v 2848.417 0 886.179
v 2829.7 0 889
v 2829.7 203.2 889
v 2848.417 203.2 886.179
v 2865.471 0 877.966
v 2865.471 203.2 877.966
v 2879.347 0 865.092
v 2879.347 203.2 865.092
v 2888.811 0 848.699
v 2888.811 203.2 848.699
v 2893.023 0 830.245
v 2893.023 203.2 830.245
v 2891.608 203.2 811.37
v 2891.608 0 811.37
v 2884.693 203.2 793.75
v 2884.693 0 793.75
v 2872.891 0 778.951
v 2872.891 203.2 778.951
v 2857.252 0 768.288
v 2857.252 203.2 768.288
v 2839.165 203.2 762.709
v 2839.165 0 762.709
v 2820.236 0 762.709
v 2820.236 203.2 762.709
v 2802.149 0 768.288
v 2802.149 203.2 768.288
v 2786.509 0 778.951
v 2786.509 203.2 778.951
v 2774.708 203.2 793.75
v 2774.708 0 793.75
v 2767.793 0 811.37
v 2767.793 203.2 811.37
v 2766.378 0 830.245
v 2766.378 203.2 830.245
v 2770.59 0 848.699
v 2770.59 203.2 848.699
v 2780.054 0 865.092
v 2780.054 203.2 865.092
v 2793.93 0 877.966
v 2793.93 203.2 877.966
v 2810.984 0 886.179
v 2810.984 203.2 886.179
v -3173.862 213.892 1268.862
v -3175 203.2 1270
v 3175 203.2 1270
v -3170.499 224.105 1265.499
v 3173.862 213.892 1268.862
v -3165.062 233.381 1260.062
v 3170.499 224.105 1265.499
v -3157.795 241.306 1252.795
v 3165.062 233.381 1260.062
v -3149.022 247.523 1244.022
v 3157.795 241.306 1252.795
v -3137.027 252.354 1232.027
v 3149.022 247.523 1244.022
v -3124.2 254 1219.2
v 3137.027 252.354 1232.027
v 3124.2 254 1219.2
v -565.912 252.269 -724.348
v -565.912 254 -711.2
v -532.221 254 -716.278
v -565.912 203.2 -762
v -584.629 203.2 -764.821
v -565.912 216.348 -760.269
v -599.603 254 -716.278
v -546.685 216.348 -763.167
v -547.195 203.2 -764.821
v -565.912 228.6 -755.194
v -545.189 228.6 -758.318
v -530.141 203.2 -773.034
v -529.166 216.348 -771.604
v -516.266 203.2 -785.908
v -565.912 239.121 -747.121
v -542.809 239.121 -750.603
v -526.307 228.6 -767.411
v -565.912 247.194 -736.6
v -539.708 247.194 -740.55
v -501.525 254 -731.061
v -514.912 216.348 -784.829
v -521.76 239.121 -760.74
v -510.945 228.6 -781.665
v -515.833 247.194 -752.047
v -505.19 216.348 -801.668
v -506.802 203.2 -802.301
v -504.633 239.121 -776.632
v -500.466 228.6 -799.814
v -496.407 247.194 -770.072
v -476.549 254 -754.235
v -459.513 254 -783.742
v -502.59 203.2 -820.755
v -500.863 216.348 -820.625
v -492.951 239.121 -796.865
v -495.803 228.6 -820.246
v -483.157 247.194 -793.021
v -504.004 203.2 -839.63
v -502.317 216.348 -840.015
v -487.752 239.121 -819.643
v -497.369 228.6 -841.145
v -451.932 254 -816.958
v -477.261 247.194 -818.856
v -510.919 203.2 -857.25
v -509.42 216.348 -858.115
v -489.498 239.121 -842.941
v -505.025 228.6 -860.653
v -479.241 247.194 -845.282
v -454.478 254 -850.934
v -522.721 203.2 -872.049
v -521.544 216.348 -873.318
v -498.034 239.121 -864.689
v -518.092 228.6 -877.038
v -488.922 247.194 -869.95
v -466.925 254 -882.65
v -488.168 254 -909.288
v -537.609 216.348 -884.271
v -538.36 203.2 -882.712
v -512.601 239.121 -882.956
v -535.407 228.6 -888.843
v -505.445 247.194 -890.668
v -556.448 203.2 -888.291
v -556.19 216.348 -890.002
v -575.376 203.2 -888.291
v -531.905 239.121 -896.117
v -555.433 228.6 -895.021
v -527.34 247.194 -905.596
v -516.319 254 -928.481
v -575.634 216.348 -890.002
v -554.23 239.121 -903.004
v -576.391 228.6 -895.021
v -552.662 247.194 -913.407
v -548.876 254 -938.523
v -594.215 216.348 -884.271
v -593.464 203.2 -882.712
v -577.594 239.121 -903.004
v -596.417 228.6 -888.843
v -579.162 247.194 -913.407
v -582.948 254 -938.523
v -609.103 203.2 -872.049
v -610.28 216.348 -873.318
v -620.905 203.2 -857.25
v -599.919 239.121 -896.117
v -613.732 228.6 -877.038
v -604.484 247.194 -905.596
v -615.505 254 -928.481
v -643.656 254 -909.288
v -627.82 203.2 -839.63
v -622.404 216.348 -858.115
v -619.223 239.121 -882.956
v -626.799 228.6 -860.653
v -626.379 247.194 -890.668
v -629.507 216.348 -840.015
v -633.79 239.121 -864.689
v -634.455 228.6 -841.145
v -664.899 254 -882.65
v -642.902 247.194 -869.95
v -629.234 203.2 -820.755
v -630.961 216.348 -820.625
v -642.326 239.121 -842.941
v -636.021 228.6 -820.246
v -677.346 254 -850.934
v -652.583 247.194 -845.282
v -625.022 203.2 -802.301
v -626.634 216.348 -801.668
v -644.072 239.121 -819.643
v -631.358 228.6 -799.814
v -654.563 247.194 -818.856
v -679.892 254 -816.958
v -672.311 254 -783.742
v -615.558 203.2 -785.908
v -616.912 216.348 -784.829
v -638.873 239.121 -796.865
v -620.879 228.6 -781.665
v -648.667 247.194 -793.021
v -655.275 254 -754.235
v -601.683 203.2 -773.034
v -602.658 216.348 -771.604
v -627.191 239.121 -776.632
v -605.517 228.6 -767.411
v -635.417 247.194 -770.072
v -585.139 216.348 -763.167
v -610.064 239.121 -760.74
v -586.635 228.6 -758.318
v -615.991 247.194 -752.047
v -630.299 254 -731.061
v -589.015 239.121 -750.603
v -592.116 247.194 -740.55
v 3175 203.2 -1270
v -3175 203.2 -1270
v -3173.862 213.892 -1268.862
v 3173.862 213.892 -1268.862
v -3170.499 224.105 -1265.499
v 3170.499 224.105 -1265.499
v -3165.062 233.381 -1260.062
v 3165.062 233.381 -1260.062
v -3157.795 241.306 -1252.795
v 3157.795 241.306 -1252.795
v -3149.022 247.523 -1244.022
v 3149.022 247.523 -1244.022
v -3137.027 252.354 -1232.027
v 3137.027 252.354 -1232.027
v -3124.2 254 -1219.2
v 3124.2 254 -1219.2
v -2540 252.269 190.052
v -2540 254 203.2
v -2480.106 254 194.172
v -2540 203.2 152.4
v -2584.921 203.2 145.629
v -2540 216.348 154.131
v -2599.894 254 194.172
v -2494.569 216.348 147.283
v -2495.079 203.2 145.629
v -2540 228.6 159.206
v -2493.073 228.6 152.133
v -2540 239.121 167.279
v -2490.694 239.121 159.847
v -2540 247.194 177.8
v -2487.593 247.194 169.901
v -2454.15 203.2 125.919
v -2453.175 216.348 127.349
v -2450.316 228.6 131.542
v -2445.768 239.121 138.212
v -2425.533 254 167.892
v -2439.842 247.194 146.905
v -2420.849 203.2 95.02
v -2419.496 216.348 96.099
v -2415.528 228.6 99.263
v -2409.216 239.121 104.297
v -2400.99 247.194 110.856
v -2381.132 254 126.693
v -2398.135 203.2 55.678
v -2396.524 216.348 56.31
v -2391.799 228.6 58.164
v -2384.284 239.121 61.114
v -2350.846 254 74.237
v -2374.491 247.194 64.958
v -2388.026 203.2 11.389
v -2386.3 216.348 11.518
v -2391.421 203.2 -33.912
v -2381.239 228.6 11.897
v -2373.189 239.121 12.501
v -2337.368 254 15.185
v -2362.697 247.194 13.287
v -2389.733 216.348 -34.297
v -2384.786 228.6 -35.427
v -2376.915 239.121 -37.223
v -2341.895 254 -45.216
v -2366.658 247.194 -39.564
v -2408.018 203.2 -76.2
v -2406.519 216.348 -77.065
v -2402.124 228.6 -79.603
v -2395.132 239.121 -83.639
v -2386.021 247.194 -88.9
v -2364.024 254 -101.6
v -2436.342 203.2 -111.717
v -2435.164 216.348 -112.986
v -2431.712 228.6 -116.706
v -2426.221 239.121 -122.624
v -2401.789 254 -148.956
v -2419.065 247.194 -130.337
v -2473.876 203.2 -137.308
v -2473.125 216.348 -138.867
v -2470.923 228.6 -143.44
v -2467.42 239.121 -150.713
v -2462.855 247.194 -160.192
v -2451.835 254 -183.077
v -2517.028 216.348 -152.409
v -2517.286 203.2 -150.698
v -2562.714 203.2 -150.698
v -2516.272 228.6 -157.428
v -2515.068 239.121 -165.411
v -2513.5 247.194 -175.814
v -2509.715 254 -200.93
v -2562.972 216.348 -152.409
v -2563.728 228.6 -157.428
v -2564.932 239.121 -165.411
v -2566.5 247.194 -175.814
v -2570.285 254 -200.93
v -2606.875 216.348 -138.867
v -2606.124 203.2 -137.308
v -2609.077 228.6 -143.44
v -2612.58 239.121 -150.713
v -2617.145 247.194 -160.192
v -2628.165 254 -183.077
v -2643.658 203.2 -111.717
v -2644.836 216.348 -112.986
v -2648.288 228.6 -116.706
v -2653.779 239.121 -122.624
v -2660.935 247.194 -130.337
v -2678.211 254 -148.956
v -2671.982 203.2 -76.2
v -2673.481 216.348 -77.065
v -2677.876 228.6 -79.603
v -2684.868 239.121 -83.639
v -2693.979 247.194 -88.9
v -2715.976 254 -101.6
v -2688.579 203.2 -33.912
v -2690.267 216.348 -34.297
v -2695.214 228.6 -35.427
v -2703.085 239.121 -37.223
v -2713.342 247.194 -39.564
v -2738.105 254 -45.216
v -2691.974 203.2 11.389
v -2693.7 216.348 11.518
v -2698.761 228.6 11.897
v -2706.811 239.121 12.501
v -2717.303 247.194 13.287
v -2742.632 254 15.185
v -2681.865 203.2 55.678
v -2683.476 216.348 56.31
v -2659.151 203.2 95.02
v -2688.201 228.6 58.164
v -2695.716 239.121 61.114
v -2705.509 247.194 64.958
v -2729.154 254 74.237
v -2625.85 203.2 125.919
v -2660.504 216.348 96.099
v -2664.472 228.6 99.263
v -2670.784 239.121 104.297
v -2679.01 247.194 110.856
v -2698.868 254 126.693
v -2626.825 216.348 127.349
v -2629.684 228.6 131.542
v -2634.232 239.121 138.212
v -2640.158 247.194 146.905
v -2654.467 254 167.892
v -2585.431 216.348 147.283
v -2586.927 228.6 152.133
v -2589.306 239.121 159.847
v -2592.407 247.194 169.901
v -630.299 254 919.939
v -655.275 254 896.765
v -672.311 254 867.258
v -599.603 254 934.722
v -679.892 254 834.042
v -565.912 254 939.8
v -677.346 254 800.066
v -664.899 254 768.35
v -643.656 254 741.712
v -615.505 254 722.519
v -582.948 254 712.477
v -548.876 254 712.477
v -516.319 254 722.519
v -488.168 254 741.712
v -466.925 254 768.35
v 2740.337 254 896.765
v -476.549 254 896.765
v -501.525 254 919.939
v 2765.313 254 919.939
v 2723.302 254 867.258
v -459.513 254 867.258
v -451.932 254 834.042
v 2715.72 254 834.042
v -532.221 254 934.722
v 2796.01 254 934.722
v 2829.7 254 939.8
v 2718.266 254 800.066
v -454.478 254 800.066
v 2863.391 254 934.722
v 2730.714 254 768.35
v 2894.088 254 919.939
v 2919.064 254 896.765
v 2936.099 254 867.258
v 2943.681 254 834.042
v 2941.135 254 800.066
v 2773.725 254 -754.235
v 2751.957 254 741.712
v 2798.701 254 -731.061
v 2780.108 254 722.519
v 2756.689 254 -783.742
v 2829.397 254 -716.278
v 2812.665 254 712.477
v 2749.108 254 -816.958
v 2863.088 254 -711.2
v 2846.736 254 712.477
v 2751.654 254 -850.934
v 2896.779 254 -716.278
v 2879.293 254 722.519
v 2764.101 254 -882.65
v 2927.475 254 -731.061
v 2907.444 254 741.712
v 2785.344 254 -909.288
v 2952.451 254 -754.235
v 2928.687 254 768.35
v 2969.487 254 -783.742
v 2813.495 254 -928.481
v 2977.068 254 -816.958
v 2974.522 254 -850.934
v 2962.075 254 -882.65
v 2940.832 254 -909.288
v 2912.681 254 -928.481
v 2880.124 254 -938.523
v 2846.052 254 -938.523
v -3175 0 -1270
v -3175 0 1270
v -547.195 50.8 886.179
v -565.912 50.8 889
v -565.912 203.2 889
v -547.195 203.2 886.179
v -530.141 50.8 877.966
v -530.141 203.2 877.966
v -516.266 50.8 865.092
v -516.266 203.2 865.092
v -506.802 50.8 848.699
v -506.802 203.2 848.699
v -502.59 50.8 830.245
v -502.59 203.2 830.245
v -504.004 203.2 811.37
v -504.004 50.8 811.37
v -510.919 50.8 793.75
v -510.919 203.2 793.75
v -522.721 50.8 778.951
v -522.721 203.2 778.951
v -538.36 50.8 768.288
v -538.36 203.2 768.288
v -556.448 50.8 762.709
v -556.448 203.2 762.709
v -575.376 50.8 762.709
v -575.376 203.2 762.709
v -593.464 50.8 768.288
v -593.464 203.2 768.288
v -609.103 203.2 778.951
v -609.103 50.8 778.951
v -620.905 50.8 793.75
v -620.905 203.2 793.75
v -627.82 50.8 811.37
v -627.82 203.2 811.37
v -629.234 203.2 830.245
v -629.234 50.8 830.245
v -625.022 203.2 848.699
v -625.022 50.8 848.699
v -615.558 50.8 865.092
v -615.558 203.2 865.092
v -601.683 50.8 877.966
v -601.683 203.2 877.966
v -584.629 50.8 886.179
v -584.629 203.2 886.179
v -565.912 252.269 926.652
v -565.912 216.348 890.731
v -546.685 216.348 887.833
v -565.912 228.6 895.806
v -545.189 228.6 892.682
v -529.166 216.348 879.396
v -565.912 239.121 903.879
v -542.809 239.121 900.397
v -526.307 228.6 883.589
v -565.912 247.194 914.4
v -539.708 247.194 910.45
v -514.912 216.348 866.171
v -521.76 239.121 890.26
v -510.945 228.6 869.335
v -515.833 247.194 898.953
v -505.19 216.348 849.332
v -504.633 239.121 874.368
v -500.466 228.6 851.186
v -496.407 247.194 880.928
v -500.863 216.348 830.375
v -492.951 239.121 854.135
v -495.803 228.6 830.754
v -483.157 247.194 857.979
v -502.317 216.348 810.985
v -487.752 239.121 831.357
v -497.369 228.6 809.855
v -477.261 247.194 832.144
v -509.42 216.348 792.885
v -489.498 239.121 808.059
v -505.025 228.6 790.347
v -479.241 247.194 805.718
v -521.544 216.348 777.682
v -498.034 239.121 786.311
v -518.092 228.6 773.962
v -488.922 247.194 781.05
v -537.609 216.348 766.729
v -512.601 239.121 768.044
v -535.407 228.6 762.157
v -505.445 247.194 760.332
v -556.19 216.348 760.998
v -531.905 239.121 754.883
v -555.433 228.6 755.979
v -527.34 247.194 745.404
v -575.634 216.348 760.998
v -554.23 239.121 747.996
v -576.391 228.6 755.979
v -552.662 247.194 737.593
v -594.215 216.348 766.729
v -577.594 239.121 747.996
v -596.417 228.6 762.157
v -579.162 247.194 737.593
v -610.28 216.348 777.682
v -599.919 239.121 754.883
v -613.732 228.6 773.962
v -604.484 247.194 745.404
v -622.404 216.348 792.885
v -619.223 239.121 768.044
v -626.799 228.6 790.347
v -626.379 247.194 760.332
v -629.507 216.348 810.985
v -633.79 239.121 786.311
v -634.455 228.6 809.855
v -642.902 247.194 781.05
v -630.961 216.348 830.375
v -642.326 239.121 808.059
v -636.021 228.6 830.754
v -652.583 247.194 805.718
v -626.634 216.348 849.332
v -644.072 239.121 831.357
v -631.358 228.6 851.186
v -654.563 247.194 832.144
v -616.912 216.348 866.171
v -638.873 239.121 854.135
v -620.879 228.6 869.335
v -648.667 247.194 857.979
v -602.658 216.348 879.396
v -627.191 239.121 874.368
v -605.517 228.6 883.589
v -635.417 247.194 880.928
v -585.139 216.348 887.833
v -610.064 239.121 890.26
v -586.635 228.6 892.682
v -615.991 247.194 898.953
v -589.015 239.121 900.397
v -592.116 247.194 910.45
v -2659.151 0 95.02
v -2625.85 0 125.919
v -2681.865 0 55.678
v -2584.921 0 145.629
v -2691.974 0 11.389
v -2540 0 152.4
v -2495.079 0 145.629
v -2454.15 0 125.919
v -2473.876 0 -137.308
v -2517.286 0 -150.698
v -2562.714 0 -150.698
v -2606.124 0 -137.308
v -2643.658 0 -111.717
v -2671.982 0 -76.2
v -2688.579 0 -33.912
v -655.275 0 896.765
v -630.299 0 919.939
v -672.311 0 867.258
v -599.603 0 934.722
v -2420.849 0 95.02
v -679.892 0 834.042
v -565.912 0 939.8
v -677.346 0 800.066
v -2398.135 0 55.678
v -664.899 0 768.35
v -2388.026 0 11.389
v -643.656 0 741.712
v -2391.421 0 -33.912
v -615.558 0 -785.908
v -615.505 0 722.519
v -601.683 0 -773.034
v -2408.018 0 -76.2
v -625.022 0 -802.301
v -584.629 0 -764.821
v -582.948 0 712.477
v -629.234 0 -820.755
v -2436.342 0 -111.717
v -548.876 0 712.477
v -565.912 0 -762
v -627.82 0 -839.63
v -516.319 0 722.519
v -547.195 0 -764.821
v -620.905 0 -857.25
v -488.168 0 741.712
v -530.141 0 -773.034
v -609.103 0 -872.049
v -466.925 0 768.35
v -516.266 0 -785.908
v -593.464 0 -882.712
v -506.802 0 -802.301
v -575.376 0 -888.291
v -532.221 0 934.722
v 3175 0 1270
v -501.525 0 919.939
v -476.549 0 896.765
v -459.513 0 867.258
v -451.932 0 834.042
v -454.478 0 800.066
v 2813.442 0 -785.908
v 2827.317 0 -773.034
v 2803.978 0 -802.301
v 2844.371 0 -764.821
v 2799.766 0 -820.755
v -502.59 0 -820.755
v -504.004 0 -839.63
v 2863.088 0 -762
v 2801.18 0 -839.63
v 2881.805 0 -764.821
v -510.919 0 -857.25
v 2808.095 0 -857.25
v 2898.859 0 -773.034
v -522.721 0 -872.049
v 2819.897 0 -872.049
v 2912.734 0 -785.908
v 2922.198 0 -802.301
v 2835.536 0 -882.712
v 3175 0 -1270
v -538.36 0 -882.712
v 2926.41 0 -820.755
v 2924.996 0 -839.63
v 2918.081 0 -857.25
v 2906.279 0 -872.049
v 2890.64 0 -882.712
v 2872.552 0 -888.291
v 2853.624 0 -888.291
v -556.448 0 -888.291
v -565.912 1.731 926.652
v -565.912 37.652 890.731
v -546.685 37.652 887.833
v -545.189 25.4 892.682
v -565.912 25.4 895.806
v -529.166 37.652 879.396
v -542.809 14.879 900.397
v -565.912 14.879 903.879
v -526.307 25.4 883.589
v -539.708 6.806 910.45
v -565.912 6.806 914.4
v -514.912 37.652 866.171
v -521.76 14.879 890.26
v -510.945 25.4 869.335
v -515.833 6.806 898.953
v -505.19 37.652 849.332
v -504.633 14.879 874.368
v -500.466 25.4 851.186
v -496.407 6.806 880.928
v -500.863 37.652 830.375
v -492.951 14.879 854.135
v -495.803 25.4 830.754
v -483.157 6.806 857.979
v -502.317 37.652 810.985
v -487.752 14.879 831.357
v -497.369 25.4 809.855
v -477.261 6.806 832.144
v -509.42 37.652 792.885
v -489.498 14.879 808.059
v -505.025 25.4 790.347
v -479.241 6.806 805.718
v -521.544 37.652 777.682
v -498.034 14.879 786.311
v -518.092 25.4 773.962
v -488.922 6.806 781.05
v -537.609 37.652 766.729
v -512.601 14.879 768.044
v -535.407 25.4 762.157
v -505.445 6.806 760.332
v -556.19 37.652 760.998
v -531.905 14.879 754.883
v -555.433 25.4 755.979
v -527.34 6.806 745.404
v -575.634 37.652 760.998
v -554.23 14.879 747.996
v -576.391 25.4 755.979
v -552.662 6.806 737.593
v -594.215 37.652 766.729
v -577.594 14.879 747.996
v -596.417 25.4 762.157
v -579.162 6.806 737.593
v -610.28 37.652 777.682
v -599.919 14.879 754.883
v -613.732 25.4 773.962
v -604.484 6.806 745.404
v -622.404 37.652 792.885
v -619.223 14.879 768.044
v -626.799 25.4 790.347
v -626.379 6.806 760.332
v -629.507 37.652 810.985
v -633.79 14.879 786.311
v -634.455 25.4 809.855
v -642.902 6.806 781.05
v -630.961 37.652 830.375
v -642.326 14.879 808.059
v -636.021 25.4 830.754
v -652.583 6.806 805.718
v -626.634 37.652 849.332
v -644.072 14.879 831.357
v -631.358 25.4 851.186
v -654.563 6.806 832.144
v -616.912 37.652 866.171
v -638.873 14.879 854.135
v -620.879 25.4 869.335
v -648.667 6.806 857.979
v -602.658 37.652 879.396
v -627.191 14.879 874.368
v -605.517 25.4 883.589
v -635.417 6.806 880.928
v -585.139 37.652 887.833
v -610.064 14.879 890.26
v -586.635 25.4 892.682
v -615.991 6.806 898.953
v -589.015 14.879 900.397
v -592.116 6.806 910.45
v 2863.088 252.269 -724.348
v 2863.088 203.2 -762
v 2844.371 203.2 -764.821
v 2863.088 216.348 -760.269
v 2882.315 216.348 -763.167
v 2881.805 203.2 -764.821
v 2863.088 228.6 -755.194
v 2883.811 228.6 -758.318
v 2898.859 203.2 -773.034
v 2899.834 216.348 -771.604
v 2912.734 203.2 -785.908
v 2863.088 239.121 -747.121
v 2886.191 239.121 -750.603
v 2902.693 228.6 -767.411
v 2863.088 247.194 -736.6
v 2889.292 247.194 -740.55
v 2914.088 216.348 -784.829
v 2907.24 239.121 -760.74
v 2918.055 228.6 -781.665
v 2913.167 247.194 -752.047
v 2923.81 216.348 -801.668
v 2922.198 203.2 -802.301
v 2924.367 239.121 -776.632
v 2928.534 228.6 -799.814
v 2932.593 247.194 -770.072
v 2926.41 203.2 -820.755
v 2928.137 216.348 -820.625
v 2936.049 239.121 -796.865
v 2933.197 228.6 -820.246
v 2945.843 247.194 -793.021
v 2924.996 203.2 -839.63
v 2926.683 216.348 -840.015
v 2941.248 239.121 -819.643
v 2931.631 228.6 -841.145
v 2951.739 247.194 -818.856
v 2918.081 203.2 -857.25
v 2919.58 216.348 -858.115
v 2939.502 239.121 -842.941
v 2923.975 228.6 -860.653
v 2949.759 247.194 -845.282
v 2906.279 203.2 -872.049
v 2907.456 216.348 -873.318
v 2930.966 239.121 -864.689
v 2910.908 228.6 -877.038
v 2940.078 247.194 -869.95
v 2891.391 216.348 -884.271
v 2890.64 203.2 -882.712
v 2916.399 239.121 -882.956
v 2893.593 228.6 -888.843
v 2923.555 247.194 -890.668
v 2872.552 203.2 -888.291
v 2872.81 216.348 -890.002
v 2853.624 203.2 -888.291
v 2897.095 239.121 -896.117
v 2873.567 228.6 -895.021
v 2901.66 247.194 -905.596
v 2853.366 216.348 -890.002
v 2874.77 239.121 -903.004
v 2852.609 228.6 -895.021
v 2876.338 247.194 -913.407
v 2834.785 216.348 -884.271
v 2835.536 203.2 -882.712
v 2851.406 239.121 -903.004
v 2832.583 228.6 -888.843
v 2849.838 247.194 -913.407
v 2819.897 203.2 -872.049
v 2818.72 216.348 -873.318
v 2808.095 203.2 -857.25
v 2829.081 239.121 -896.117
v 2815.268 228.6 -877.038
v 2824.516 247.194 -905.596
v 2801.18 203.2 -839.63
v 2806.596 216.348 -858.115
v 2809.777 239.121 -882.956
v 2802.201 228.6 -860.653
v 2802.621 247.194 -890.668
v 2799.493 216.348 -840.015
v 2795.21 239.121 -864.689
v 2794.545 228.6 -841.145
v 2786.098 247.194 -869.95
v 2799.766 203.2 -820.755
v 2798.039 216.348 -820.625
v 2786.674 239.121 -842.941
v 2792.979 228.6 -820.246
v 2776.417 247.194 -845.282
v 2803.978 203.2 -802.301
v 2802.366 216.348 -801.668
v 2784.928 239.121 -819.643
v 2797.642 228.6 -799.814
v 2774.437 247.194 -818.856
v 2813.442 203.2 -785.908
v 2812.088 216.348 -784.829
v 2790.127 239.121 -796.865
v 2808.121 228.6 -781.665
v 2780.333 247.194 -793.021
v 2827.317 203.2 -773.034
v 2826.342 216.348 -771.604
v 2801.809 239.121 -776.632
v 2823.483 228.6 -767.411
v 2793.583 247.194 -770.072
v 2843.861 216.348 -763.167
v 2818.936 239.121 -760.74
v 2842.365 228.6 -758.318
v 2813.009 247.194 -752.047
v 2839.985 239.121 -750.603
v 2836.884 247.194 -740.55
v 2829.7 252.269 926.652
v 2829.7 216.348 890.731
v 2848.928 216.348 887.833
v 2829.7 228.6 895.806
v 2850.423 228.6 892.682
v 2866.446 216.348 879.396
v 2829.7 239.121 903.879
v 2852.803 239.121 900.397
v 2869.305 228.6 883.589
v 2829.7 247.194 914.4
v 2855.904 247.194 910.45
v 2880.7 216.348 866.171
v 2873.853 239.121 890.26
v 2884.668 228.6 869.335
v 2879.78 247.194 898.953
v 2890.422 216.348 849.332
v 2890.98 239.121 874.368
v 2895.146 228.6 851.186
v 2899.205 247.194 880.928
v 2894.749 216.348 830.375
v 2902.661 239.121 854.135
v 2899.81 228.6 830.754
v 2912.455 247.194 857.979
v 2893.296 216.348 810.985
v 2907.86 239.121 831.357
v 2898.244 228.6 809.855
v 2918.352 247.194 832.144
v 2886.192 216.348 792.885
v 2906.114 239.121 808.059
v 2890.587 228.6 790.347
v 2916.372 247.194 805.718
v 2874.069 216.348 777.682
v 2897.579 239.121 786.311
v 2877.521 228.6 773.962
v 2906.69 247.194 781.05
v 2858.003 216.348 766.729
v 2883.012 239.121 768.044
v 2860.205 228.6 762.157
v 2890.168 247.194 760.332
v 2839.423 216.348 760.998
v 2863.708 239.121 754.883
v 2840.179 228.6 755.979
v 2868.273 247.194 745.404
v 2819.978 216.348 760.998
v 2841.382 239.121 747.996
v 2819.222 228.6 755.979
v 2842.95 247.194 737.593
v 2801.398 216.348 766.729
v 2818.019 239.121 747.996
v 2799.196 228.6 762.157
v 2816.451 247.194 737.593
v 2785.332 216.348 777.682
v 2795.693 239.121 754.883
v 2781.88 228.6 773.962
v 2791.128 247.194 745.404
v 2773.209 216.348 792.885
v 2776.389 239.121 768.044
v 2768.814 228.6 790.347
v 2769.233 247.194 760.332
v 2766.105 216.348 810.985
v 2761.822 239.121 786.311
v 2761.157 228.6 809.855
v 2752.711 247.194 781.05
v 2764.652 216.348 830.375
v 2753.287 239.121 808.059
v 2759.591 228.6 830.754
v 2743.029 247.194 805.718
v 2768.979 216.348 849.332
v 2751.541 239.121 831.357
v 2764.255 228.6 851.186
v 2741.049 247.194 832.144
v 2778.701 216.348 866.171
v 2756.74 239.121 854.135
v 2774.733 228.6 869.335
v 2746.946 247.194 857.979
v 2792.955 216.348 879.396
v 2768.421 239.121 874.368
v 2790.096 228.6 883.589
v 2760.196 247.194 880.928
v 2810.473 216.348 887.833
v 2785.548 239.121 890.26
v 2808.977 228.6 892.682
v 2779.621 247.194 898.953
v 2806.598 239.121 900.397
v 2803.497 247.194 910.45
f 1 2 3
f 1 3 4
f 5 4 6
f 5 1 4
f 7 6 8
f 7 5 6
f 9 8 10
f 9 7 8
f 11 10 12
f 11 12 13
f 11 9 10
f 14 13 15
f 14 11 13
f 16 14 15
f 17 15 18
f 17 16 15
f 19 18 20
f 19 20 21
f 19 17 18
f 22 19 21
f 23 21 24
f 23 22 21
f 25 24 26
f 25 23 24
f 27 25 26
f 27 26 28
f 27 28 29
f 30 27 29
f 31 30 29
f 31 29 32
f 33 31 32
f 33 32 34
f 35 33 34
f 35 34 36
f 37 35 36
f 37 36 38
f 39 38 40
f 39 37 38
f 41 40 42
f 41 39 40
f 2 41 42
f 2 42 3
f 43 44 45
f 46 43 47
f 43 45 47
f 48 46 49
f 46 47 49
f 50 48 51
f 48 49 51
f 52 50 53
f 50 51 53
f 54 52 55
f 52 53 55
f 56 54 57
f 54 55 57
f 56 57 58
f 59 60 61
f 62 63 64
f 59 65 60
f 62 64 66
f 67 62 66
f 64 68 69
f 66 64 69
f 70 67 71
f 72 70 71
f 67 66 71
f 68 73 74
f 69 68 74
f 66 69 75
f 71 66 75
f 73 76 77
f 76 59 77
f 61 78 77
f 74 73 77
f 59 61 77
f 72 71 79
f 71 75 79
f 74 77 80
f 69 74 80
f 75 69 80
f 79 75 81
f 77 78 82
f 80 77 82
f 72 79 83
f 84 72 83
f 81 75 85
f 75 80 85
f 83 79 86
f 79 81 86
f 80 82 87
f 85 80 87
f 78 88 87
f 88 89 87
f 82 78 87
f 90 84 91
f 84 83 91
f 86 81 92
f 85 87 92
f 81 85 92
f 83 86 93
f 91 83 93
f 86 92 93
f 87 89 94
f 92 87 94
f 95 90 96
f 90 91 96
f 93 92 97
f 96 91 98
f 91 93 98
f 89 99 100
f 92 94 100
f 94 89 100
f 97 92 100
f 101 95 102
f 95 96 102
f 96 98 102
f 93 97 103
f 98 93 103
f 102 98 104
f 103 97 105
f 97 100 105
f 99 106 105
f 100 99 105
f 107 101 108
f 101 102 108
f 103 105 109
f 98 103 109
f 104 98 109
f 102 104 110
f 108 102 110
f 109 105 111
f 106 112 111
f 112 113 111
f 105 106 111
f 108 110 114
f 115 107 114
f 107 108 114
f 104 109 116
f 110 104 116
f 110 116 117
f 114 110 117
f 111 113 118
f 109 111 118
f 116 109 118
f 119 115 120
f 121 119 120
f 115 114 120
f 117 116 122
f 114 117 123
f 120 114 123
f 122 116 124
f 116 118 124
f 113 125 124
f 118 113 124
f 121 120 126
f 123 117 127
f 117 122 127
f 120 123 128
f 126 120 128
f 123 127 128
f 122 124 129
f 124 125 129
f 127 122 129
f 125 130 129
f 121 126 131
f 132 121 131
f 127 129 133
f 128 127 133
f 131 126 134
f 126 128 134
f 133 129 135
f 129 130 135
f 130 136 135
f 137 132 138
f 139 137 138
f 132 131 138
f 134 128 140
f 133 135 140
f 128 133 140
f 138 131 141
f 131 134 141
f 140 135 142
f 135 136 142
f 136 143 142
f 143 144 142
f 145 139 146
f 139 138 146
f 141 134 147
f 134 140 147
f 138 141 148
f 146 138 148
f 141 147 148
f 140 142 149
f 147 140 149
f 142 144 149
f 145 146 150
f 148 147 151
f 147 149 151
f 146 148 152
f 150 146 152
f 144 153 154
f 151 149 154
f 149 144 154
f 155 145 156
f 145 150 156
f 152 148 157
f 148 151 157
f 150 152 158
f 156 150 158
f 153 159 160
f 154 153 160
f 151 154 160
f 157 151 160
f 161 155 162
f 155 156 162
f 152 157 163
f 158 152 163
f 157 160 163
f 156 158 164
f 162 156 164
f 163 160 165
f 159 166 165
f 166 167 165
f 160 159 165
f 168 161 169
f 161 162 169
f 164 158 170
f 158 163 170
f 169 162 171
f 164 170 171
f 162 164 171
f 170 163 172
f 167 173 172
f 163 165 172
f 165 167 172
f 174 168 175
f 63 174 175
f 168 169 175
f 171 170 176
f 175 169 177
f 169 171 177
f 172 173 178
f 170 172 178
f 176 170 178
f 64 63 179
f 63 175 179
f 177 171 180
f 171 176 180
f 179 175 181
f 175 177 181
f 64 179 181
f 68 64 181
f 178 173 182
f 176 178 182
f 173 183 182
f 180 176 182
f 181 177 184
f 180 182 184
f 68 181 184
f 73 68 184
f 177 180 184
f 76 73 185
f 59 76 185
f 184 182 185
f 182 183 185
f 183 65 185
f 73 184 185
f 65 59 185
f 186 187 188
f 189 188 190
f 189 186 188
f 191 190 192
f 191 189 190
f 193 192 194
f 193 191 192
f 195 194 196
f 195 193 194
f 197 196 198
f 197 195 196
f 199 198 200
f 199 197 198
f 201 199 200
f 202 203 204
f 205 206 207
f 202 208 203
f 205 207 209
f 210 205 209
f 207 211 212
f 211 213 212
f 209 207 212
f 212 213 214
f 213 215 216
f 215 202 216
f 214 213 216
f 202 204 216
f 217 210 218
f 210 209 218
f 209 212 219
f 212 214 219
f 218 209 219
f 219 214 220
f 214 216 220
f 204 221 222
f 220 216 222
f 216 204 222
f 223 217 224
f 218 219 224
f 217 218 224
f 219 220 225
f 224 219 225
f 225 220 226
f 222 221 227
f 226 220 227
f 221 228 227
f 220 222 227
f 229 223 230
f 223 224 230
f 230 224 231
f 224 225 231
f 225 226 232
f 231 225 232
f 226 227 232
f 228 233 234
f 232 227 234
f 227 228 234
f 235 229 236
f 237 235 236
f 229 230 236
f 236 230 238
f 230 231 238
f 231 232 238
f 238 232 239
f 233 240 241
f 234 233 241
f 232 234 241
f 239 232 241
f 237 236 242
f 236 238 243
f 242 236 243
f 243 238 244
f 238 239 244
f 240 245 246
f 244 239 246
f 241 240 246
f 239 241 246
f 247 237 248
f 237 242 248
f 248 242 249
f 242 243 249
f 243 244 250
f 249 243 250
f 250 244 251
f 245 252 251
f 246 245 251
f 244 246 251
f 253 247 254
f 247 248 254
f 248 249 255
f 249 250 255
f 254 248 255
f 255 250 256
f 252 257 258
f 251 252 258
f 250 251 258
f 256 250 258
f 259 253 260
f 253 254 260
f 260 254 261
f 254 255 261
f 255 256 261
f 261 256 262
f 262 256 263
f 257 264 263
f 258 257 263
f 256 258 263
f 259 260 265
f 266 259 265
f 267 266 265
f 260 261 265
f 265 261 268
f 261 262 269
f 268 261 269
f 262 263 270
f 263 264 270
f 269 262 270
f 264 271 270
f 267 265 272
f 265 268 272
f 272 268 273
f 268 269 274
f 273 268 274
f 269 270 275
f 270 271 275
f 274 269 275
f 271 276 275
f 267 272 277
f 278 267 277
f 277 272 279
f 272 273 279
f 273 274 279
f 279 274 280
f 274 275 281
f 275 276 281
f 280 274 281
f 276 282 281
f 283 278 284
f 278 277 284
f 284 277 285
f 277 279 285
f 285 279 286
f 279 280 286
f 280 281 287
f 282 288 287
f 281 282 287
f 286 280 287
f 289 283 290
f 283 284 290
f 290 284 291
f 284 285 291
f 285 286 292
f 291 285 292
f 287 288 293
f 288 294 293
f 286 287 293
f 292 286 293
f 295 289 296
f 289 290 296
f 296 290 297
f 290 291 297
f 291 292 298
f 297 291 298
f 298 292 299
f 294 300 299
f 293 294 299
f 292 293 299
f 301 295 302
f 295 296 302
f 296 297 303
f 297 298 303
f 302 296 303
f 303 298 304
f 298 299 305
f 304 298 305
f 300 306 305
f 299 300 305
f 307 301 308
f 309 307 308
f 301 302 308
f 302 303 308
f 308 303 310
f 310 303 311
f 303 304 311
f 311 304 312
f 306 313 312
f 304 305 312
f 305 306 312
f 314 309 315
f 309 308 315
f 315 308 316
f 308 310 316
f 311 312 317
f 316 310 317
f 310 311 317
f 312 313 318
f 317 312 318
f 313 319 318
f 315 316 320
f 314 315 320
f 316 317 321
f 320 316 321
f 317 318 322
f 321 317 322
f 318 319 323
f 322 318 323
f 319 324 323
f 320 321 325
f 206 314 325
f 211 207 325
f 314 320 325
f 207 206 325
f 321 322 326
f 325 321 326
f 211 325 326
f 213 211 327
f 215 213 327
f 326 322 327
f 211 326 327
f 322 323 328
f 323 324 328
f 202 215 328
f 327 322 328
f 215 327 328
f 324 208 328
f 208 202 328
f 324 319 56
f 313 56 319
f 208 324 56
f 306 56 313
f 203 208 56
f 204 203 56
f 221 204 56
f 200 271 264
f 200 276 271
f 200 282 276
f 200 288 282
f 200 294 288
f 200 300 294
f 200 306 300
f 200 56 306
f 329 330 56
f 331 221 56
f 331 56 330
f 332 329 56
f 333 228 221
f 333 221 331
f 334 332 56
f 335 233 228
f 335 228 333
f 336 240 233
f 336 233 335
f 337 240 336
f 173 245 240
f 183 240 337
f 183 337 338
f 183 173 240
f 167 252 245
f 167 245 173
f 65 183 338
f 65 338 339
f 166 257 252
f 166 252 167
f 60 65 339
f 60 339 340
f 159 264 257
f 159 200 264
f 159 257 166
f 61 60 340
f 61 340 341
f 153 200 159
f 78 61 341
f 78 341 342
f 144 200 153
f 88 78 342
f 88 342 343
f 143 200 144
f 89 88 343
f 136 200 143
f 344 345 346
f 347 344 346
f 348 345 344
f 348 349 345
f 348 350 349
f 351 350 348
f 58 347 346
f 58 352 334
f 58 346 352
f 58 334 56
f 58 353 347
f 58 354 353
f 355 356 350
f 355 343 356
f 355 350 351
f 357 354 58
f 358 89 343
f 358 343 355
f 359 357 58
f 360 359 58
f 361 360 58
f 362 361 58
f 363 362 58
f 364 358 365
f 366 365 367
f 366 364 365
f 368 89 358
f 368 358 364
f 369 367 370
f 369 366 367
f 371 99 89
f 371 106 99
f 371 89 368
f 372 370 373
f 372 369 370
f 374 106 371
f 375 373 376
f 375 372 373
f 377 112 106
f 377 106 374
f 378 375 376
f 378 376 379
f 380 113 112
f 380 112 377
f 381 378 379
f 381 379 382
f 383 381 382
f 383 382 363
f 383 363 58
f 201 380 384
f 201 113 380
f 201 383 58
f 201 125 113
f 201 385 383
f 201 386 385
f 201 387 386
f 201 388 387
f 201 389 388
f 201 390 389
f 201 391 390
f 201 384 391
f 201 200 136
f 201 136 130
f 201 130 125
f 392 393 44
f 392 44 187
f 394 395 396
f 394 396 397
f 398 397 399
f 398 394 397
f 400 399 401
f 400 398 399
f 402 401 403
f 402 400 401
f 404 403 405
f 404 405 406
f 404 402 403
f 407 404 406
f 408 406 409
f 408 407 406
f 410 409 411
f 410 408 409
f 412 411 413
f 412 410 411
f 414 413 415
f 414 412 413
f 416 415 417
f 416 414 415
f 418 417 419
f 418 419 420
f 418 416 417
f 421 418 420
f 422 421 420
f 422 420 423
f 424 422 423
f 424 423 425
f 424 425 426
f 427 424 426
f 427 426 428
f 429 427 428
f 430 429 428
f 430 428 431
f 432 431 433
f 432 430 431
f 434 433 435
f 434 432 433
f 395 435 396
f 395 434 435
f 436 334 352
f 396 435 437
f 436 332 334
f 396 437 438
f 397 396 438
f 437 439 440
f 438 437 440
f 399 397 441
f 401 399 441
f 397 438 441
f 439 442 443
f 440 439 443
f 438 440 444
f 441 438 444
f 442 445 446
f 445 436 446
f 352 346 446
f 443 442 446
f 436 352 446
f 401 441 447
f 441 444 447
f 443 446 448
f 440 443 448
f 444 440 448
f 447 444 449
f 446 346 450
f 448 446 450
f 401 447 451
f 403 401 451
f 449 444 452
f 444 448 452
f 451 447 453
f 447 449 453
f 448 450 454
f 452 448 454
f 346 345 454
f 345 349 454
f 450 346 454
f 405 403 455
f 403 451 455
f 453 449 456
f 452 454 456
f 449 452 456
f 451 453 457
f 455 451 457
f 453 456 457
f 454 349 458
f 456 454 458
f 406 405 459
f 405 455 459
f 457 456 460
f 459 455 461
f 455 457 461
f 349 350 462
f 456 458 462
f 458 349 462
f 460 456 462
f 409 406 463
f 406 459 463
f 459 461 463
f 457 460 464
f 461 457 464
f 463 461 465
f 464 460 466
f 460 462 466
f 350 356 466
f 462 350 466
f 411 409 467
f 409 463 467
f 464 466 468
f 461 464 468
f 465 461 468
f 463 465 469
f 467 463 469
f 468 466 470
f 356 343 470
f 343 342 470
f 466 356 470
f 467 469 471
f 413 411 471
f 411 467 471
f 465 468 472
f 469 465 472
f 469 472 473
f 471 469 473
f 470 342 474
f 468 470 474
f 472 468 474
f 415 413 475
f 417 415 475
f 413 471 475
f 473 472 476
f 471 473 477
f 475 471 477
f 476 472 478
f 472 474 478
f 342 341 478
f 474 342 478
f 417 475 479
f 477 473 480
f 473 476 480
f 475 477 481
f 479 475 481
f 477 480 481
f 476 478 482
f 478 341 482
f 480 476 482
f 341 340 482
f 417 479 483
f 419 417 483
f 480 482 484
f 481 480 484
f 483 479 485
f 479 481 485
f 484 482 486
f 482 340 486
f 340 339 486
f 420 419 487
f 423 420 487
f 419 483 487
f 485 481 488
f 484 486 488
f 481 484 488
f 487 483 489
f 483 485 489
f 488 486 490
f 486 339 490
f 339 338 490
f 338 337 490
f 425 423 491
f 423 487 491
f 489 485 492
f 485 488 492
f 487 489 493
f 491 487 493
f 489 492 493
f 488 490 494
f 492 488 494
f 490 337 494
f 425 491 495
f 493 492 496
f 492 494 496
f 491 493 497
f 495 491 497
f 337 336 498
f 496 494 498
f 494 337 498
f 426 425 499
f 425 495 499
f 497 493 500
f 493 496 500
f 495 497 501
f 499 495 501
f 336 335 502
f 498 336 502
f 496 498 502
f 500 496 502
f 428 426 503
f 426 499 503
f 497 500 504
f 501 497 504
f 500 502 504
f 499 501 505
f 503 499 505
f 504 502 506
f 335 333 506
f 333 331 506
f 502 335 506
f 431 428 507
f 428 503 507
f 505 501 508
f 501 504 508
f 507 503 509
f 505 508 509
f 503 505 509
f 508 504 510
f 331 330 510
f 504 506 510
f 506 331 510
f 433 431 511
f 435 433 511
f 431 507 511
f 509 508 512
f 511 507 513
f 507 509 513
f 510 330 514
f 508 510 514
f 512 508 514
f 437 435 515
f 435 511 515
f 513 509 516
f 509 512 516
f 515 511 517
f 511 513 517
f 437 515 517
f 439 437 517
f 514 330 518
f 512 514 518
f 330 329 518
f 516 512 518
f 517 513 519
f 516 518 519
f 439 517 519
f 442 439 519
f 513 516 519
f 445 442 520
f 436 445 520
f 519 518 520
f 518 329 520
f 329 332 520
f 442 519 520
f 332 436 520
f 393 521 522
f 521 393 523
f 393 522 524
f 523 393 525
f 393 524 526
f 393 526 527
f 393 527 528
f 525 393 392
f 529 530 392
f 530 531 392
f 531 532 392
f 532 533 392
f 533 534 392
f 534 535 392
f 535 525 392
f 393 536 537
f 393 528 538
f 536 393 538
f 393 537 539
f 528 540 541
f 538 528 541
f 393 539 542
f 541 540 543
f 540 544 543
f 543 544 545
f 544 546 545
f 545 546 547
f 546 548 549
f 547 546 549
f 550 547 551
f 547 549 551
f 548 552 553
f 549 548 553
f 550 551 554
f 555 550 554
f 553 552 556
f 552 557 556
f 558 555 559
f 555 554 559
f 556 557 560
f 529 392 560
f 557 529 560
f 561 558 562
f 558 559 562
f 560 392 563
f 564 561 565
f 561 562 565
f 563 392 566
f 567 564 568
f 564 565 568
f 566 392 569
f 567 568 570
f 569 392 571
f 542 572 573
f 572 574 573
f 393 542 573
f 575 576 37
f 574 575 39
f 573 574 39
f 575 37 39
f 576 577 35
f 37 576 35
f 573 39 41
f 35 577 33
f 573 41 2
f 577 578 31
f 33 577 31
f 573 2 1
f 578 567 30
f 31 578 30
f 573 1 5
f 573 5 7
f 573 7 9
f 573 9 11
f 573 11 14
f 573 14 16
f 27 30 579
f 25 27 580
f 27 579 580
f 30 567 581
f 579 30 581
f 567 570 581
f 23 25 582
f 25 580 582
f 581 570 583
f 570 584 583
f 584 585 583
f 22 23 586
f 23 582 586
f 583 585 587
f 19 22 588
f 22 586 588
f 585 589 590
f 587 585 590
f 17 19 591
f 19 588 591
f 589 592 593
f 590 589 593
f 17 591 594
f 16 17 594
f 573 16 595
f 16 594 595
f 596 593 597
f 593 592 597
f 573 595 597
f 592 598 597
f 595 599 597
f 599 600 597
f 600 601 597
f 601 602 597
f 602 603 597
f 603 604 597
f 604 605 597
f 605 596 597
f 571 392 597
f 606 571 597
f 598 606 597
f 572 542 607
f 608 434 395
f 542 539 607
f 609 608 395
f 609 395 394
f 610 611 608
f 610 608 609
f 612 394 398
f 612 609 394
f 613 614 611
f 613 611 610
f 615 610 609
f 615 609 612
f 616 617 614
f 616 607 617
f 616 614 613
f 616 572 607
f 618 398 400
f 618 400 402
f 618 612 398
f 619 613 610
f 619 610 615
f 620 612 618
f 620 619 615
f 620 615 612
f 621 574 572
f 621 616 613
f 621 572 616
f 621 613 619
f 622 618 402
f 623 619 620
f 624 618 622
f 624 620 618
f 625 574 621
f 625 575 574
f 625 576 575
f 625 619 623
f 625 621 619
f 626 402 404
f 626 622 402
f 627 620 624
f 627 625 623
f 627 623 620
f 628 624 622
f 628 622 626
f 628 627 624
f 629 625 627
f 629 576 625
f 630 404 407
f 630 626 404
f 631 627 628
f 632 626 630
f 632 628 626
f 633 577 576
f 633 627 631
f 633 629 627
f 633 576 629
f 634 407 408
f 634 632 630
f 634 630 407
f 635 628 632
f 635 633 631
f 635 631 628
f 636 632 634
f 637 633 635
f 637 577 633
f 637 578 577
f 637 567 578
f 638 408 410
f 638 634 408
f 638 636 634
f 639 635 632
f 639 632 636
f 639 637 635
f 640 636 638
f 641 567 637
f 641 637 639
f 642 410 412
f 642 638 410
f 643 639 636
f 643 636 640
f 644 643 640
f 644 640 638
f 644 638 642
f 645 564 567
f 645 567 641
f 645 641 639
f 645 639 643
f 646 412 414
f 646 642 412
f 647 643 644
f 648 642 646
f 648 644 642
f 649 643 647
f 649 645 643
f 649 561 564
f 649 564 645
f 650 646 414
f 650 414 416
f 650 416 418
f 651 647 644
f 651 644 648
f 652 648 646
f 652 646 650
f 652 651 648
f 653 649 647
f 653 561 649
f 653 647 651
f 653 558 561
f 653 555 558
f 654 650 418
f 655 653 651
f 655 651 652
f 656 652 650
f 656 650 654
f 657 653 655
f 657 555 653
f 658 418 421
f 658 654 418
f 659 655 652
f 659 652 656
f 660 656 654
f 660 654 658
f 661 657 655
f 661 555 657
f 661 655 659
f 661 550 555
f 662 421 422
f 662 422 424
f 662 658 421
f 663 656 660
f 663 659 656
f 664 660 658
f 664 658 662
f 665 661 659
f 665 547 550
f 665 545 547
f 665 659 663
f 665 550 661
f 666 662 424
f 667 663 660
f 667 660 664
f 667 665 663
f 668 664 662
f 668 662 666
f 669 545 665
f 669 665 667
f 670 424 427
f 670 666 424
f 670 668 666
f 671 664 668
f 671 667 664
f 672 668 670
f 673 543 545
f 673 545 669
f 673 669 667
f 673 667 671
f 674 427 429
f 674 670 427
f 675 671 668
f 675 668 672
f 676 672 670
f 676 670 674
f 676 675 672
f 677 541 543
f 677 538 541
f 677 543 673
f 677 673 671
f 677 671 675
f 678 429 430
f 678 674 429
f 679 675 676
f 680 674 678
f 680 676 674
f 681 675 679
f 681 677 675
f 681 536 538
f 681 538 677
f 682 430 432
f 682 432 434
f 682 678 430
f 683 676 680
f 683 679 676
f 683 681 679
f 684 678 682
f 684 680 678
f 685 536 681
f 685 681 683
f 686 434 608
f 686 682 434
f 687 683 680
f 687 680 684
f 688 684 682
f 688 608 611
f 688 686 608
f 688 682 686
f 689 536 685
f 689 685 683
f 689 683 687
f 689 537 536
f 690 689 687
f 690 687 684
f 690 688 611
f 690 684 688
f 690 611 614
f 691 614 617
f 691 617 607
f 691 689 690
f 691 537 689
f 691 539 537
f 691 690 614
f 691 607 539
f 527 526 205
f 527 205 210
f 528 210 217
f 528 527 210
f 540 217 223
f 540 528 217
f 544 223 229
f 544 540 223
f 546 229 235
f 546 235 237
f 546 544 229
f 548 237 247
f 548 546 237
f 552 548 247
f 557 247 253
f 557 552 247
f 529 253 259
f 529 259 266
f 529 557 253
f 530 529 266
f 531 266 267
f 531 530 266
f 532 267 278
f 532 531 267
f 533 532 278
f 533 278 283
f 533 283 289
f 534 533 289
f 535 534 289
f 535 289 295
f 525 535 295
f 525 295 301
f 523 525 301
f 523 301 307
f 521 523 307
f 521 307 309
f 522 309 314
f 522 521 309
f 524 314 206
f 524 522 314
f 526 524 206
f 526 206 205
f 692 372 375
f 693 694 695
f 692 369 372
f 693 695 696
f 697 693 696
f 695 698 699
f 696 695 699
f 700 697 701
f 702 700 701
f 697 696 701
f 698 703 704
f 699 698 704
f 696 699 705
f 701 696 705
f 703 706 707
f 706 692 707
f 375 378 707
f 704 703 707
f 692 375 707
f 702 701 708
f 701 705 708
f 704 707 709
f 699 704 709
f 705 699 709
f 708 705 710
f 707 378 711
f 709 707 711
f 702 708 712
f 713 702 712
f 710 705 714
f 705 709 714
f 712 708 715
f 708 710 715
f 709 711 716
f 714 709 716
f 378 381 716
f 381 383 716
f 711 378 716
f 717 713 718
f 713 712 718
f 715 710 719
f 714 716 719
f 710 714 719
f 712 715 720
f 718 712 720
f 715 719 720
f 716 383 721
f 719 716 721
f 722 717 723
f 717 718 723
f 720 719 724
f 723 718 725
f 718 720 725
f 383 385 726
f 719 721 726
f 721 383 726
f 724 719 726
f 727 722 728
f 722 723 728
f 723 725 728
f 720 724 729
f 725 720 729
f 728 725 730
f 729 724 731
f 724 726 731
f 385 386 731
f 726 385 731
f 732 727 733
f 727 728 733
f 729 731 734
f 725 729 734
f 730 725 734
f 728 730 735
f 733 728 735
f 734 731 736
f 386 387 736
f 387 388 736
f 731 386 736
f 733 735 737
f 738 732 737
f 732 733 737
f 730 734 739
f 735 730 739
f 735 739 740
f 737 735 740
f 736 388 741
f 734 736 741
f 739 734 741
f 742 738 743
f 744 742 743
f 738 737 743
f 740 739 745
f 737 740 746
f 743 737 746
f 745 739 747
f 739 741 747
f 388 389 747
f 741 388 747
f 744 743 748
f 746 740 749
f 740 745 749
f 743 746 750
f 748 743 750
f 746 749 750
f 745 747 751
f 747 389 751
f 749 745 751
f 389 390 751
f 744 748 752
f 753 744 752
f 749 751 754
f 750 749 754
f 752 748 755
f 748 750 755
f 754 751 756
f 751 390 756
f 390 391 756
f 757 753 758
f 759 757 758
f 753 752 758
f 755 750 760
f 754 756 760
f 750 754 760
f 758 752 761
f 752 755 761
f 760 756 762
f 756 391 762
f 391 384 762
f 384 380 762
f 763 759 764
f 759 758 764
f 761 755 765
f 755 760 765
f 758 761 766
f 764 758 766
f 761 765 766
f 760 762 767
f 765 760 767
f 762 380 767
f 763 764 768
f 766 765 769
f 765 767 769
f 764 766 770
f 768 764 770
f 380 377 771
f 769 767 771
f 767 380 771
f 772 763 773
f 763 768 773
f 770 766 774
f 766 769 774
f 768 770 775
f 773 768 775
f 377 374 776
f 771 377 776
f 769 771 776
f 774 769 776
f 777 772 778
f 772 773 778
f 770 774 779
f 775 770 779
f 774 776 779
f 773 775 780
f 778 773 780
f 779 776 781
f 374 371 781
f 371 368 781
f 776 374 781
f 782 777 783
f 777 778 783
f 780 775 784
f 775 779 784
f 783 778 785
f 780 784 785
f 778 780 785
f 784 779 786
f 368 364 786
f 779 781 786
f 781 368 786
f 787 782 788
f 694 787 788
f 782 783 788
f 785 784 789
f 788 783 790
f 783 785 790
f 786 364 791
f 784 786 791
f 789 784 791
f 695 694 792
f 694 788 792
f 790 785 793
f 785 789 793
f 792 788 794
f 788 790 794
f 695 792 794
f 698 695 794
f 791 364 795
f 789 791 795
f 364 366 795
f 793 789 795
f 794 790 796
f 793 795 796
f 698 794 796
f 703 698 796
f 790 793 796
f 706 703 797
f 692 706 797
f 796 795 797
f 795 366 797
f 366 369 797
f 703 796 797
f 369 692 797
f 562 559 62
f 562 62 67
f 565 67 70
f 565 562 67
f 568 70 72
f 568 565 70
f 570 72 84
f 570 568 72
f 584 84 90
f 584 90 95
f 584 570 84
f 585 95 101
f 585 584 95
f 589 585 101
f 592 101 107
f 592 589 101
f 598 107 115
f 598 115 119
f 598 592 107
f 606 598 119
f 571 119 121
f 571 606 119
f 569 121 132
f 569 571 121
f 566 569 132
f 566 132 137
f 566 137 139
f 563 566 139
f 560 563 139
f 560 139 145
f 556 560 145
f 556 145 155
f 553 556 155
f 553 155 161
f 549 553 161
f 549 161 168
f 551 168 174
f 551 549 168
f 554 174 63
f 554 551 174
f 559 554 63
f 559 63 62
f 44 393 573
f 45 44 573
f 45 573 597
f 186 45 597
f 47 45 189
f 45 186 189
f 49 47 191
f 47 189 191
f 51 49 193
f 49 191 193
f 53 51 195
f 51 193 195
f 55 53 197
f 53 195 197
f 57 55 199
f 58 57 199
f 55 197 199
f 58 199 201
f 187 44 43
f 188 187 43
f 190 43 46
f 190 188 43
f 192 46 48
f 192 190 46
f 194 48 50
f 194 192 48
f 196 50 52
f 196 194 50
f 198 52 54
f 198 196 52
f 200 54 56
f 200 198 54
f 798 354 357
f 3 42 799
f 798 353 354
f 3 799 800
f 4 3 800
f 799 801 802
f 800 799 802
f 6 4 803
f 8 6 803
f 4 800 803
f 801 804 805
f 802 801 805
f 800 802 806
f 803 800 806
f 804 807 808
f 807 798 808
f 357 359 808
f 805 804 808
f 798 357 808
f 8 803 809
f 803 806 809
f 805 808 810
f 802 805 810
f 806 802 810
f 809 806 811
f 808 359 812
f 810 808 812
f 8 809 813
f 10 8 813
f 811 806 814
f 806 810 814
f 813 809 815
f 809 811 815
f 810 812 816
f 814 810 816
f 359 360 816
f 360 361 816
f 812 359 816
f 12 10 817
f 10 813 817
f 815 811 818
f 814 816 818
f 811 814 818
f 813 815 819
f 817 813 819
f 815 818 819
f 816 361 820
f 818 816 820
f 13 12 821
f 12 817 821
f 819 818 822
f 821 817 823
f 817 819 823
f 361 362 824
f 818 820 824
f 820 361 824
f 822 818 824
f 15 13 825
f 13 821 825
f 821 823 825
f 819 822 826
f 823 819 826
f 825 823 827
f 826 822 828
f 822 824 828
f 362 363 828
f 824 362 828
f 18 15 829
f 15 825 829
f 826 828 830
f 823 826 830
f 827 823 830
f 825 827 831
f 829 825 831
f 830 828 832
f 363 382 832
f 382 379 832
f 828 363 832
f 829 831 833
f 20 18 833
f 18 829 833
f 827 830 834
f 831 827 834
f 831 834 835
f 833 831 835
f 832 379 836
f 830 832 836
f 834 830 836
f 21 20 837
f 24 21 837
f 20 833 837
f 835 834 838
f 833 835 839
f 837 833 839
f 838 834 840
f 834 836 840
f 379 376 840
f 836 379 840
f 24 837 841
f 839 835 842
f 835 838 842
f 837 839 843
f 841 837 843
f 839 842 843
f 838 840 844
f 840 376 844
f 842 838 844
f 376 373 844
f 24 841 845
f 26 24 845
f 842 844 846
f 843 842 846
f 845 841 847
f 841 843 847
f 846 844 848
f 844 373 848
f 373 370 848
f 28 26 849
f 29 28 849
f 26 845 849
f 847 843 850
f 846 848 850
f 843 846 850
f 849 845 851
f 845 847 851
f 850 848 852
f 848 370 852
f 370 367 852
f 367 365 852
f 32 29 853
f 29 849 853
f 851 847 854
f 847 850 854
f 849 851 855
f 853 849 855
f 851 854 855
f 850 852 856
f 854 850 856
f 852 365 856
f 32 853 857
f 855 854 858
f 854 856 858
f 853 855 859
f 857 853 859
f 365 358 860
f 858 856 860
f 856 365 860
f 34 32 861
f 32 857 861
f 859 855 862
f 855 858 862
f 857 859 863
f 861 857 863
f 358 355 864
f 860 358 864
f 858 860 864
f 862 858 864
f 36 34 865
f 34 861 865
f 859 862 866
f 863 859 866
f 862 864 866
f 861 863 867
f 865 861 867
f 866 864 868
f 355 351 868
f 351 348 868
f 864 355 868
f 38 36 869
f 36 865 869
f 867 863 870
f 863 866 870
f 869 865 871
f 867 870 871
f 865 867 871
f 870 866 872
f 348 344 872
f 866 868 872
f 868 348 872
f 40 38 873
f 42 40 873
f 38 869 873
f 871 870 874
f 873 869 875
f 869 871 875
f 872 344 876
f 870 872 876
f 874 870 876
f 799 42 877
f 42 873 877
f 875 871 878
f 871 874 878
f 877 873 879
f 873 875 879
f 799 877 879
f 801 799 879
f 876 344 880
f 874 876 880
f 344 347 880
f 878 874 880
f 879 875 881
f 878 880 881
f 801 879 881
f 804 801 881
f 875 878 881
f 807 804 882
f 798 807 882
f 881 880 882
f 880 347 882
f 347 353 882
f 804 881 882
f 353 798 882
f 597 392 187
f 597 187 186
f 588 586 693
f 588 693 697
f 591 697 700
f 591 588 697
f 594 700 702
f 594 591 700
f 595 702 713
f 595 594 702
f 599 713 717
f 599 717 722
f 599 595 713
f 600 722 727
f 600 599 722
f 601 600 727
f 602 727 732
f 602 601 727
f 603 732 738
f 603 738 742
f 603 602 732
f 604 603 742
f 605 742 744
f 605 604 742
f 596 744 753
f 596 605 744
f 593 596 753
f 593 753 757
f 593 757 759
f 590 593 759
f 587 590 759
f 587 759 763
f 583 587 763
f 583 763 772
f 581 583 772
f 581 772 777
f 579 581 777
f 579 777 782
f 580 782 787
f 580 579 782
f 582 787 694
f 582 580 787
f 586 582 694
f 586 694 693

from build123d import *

# Parameters (mm, degrees)
SKETCH1_W           = 6350
SKETCH1_H           = 2540
SKETCH1_R           = 152.4
SKETCH1_R_2         = 63.5
BOSS_EXTRUDE1_DEPTH = 254
FILLET1_R           = 50.8


with BuildPart() as part:
    # Sketch1 → Boss-Extrude1 (new body)
    with BuildSketch(Plane(origin=(0, 0, 0), x_dir=(1, 0, 0), z_dir=(0, 1, 0))):
        Rectangle(SKETCH1_W, SKETCH1_H)
        with Locations(Location((-2540, 0, 0), (0, 0, 270))):
            Circle(SKETCH1_R, mode=Mode.SUBTRACT)
        with Locations(Location((-565.912, 825.5, 0), (0, 0, 270))):
            Circle(SKETCH1_R_2, mode=Mode.SUBTRACT)
        with Locations(Location((-565.912, -825.5, 0), (0, 0, 270))):
            Circle(SKETCH1_R_2, mode=Mode.SUBTRACT)
        with Locations(Location((2829.700460829, -825.5, 0), (0, 0, 270))):
            Circle(SKETCH1_R_2, mode=Mode.SUBTRACT)
        with Locations(Location((2863.088, 825.5, 0), (0, 0, 270))):
            Circle(SKETCH1_R_2, mode=Mode.SUBTRACT)
    extrude(amount=BOSS_EXTRUDE1_DEPTH)

    # Fillet1
    fillet1_edges = [part.edges().sort_by_distance(p)[0] for p in [
        (-2540, 254, -152.4),
        (-3175, 254, 0),
        (-565.912, 254, -889),
        (0, 254, 1270),
        (-565.912, 0, 762),
        (-565.912, 254, 762),
        (2829.700460829, 254, 762),
        (2863.088, 254, -889),
        (3175, 254, 0),
        (0, 254, -1270),
    ]]
    fillet(fillet1_edges, radius=FILLET1_R)


solid = part.part
